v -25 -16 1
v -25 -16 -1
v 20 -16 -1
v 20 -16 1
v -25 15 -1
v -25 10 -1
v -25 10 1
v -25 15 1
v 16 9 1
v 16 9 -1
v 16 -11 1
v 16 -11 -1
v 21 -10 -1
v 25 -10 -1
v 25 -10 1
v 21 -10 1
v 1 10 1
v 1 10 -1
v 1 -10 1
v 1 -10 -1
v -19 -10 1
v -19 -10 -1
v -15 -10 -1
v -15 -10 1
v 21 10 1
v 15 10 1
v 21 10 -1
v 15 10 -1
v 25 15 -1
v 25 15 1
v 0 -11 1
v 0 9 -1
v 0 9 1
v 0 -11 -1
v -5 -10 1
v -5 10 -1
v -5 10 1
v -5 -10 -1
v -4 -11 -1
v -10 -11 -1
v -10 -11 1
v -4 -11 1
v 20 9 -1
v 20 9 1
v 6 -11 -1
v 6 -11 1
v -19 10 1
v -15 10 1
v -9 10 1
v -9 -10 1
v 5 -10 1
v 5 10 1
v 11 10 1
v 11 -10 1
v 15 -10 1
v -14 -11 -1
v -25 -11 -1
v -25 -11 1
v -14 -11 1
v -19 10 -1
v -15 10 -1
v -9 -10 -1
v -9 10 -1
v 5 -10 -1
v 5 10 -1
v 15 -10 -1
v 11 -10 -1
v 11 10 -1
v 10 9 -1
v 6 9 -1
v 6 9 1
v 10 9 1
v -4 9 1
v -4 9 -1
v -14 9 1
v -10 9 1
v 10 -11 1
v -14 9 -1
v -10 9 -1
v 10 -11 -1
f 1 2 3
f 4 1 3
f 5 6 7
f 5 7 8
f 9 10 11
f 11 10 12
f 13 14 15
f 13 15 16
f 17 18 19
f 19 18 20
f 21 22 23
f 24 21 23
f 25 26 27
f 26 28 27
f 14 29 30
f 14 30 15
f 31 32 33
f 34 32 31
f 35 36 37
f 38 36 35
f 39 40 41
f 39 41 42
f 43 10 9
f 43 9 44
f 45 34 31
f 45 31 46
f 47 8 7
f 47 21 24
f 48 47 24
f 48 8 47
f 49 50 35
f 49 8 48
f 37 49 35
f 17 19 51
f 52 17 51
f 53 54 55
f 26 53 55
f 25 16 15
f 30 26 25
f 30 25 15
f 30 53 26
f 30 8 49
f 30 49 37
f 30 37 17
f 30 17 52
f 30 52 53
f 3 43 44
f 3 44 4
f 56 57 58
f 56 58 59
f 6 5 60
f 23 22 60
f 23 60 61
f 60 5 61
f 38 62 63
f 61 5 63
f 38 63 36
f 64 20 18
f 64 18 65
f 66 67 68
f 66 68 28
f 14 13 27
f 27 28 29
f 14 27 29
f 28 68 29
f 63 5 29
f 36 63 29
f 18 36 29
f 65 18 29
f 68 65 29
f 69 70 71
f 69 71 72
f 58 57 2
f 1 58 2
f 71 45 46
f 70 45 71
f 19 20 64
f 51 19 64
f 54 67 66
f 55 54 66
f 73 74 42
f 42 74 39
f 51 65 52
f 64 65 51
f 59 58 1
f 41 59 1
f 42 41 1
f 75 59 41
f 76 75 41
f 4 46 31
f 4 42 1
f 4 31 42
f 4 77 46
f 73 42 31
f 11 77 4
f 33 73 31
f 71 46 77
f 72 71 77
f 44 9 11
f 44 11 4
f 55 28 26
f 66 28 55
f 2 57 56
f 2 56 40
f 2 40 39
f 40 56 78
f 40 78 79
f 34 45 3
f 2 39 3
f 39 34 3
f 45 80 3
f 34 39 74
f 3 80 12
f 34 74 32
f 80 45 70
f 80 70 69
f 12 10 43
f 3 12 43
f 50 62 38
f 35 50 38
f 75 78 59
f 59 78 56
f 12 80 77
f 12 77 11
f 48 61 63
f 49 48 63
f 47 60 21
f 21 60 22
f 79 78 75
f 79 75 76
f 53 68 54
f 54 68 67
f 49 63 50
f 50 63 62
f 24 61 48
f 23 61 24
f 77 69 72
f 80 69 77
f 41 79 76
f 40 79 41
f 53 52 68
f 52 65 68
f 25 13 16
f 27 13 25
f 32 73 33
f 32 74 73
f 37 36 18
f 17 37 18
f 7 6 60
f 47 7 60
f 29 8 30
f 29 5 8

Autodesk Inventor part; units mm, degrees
ref_plane "YZ Plane" through (0, 0, 0) normal (1, 0, 0) x (0, 1, 0)
ref_plane "XZ Plane" through (0, 0, 0) normal (0, 1, 0) x (-1, 0, 0)
ref_plane "XY Plane" through (0, 0, 0) normal (0, 0, 1) x (1, 0, 0)
sketch "Esboço1" plane through (0, 0, 0) normal (0, 0, 1) x (1, 0, 0)
  line L0 (-25, 10) -> (-25, 15)
  line L1 (-25, 15) -> (25, 15)
  line L2 (25, 15) -> (25, -10)
  line L3 (25, -10) -> (21, -10)
  line L4 (21, -10) -> (21, 10)
  line L5 (15, 10) -> (21, 10)
  line L6 (15, 10) -> (15, -10)
  line L7 (1, -10) -> (5, -10)
  line L8 (1, 10) -> (1, -10)
  line L9 (11, -10) -> (15, -10)
  line L10 (11, 10) -> (11, -10)
  line L11 (5, 10) -> (11, 10)
  line L12 (5, 10) -> (5, -10)
  line L13 (-9, 10) -> (-9, -10)
  line L14 (-5, 10) -> (-5, -10)
  line L15 (-5, 10) -> (1, 10)
  line L16 (-9, -10) -> (-5, -10)
  line L17 (-15, 10) -> (-9, 10)
  line L18 (-19, 10) -> (-19, -10)
  line L19 (-15, 10) -> (-15, -10)
  line L20 (-25, 10) -> (-19, 10)
  line L21 (-19, -10) -> (-15, -10)
  line L22 (-25, -16) -> (20, -16)
  line L23 (-25, -11) -> (-25, -16)
  line L24 (-10, -11) -> (-4, -11)
  line L25 (-10, 9) -> (-10, -11)
  line L26 (-14, 9) -> (-14, -11)
  line L27 (6, -11) -> (6, 9)
  line L28 (16, 9) -> (16, -11)
  line L29 (10, 9) -> (10, -11)
  line L30 (-4, 9) -> (-4, -11)
  line L31 (0, 9) -> (0, -11)
  line L32 (20, 9) -> (20, -16)
  line L33 (-25, -11) -> (-14, -11)
  line L34 (-14, 9) -> (-10, 9)
  line L35 (-4, 9) -> (0, 9)
  line L36 (0, -11) -> (6, -11)
  line L37 (6, 9) -> (10, 9)
  line L38 (16, 9) -> (20, 9)
  line L39 (10, -11) -> (16, -11)
  point P0 (0, 0)
  point P1 (0, 15)
  dimension "d5" = 5
  dimension "d6" = 50
  dimension "d7" = 15
  dimension "d9" = 25
  dimension "d10" = 4
  dimension "d12" = 6
  dimension "d37" = 5
  dimension "d43" = 1
  dimension "d45" = 1
extrude "Extrusão1" add sketch "Esboço1" along normal mid plane 2
properties part number "Sensor_0001_001"
